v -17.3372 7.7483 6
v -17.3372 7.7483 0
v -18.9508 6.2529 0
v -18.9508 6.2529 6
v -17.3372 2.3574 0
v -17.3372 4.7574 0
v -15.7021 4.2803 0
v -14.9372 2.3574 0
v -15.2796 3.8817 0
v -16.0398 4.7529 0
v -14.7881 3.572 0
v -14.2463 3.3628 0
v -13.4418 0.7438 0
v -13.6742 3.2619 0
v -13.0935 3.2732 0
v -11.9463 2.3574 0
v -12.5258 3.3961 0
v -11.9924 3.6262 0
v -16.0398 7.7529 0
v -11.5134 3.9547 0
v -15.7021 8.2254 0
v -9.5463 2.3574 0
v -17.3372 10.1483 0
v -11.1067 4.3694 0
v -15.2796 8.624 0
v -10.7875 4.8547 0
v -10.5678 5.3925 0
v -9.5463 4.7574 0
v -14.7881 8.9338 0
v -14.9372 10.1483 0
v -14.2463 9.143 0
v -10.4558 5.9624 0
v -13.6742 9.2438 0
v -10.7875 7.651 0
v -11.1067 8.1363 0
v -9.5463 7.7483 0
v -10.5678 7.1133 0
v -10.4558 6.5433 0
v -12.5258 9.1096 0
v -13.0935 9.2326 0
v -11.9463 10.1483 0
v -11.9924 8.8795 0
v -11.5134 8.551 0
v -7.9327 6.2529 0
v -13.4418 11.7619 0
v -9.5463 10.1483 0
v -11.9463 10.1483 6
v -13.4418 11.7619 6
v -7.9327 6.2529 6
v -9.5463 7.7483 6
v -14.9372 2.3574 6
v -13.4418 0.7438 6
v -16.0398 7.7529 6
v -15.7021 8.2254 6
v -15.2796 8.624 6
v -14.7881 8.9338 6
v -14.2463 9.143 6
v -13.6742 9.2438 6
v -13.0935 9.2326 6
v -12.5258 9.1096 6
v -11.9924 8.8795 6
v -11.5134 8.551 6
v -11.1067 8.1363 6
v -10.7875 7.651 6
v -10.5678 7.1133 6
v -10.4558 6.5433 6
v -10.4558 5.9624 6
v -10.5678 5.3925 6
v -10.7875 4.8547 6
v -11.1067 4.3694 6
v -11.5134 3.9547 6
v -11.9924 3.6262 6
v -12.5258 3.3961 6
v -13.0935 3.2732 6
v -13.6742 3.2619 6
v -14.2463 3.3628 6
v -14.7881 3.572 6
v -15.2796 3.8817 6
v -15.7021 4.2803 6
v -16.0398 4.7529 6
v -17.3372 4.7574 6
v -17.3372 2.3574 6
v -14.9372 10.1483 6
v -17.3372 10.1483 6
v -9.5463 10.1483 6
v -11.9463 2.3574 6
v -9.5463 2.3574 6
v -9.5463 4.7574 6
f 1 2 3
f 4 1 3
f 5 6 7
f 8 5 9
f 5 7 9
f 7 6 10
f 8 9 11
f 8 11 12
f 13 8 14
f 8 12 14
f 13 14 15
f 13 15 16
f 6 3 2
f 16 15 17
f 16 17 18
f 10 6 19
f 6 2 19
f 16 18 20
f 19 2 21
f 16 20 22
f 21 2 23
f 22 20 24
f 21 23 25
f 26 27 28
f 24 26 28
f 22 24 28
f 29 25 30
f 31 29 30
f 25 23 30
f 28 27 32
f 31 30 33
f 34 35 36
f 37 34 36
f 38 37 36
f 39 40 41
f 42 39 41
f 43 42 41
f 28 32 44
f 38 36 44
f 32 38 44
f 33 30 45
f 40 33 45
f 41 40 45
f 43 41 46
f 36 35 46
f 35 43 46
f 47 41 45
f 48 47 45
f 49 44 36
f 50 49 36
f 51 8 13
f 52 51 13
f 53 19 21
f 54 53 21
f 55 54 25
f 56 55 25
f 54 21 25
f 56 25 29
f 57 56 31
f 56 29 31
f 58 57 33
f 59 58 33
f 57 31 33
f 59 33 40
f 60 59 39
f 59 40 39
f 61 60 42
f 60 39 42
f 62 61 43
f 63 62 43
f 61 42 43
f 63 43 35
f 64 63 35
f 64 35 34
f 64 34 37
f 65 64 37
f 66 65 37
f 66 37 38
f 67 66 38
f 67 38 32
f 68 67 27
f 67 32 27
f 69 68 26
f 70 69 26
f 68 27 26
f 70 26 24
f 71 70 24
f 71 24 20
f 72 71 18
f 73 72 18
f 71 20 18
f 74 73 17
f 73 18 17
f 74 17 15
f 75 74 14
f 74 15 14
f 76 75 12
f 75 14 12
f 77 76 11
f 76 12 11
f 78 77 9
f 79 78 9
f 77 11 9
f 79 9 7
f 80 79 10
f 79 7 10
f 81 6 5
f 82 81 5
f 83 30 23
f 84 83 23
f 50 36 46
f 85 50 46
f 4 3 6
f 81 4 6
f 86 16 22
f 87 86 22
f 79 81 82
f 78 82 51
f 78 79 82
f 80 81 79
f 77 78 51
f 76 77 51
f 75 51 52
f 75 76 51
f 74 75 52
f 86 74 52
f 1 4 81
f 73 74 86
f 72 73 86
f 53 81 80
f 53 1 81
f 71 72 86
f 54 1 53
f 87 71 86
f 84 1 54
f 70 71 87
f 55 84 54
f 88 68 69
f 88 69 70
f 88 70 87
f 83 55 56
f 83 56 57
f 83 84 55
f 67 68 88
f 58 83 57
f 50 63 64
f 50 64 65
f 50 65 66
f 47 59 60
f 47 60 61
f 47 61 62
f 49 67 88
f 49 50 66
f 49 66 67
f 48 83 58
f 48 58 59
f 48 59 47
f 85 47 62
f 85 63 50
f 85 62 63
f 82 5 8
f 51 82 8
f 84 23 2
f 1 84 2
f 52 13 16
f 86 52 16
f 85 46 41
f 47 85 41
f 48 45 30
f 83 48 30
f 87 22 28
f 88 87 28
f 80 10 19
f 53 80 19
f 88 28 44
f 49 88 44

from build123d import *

# Parameters (mm, degrees)
BOSS_EXTRU_1_DEPTH = 6


with BuildPart() as part:
    # Esquisse1 → Boss.-Extru.1 (new body)
    with BuildSketch(Plane.XY):
        Polygon((-14.937221854, 10.148336377), (-17.337221854, 10.148336377), (-17.337221854, 7.748336377), (-18.950778827, 6.252865249), (-17.337221854, 4.757394121), (-17.337221854, 2.357394121), (-14.937221854, 2.357394121), (-13.441750726, 0.743837148), (-11.946279598, 2.357394121), (-9.546279598, 2.357394121), (-9.546279598, 4.757394121), (-7.932722625, 6.252865249), (-9.546279598, 7.748336377), (-9.546279598, 10.148336377), (-11.946279598, 10.148336377), (-13.441750726, 11.761893351), align=None)
        with BuildLine():
            Line((-16.039826937, 4.752865249), (-16.039826937, 7.752865249))
            ThreePointArc((-16.039826937, 7.752865249), (-10.441750726, 6.252865249), (-16.039826937, 4.752865249))
        make_face(mode=Mode.SUBTRACT)
    extrude(amount=BOSS_EXTRU_1_DEPTH)


solid = part.part
